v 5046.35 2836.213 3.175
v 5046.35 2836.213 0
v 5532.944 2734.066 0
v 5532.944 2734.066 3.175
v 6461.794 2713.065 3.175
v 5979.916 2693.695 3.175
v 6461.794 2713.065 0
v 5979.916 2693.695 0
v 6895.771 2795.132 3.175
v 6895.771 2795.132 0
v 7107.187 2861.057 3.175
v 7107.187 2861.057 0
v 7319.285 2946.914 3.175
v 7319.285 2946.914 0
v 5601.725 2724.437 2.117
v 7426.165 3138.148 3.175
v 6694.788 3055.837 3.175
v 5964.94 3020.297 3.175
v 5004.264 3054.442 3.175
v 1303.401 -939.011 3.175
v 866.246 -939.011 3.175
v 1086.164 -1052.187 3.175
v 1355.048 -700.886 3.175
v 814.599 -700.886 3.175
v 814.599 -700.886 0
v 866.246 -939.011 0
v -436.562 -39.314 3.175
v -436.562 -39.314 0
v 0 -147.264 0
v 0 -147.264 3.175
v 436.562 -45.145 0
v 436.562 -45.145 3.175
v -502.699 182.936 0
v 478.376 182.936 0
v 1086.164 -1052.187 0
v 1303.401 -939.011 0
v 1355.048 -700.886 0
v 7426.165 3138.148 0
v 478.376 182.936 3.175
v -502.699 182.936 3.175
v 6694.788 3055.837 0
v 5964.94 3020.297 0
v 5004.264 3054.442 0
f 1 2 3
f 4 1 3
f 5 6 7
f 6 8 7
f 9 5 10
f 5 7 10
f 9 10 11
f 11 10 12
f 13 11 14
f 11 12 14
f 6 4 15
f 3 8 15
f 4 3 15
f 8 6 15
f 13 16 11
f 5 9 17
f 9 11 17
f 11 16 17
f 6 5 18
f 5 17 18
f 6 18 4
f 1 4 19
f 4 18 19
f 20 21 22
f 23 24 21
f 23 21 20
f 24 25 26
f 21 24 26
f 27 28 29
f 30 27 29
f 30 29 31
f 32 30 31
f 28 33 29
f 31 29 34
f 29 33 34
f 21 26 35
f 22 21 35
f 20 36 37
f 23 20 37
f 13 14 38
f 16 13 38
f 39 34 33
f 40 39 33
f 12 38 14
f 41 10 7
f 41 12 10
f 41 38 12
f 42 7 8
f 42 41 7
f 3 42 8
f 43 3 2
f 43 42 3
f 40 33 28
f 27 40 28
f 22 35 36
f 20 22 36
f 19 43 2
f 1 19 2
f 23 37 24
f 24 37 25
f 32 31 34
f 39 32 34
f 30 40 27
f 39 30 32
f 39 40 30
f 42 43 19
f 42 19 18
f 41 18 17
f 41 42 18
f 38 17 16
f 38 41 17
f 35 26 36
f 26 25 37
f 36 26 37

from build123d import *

# Parameters (mm, degrees)
F1_DEPTH = 3.175


with BuildPart() as f1:
    # F0 (on Top) → F1 (new body)
    with BuildSketch(Plane.XY):
        Polygon((478.3758758316, 182.9355446815), (-502.6991241684, 182.9355446815), (-436.5625, -39.3144553185), (0, -147.2644553185), (436.5625, -45.1450444118), align=None)
    extrude(amount=F1_DEPTH)


with BuildPart() as f1b:
    # F0 (on Top) → F1, piece 2 (new body)
    with BuildSketch(Plane.XY):
        Polygon((1355.0481769202, -700.8860598505), (814.5985533949, -700.8860598505), (866.2462137248, -939.0110598505), (1086.1635581172, -1052.187437497), (1303.4005165903, -939.0110598505), align=None)
    extrude(amount=F1_DEPTH)


with BuildPart() as f1c:
    # F0 (on Top) → F1, piece 3 (new body)
    with BuildSketch(Plane.XY):
        with BuildLine():
            add(Edge.make_bspline(
                [(5004.2643065248, 3054.4415440145), (5101.4069513777, 3050.4495410192), (5281.9379455615, 3040.3072252803), (5590.9966337127, 3026.4202168743), (5893.7548598436, 3015.825212992), (6198.2881476865, 3027.7397664991), (6502.6243242214, 3041.4868527125), (6810.0959489947, 3063.460409532), (7110.3376749352, 3098.3340122565), (7329.3139665379, 3120.3509502336), (7426.1650824293, 3138.1481291863)],
                knots=[0, 0, 0, 0, 0.1200056765, 0.2455584837, 0.370853828, 0.4959351742, 0.6212972289, 0.7469550661, 0.8725814469, 1, 1, 1, 1], degree=3))
            Line((5004.2643065248, 3054.4415440145), (5046.3500022888, 2836.2126350403))
            add(Edge.make_bspline(
                [(5046.3500022888, 2836.2126350403), (5434.8536215423, 2731.7176427074), (6389.7097788452, 2523.759898109), (7319.2846324672, 2946.9141755042)],
                knots=[0, 0, 0, 0, 2275.6288502577, 2275.6288502577, 2275.6288502577, 2275.6288502577], degree=3))
            Line((7319.2846324672, 2946.9141755042), (7426.1650824293, 3138.1481291863))
        make_face()
    extrude(amount=F1_DEPTH)


solid = Compound([f1.part, f1b.part, f1c.part])
